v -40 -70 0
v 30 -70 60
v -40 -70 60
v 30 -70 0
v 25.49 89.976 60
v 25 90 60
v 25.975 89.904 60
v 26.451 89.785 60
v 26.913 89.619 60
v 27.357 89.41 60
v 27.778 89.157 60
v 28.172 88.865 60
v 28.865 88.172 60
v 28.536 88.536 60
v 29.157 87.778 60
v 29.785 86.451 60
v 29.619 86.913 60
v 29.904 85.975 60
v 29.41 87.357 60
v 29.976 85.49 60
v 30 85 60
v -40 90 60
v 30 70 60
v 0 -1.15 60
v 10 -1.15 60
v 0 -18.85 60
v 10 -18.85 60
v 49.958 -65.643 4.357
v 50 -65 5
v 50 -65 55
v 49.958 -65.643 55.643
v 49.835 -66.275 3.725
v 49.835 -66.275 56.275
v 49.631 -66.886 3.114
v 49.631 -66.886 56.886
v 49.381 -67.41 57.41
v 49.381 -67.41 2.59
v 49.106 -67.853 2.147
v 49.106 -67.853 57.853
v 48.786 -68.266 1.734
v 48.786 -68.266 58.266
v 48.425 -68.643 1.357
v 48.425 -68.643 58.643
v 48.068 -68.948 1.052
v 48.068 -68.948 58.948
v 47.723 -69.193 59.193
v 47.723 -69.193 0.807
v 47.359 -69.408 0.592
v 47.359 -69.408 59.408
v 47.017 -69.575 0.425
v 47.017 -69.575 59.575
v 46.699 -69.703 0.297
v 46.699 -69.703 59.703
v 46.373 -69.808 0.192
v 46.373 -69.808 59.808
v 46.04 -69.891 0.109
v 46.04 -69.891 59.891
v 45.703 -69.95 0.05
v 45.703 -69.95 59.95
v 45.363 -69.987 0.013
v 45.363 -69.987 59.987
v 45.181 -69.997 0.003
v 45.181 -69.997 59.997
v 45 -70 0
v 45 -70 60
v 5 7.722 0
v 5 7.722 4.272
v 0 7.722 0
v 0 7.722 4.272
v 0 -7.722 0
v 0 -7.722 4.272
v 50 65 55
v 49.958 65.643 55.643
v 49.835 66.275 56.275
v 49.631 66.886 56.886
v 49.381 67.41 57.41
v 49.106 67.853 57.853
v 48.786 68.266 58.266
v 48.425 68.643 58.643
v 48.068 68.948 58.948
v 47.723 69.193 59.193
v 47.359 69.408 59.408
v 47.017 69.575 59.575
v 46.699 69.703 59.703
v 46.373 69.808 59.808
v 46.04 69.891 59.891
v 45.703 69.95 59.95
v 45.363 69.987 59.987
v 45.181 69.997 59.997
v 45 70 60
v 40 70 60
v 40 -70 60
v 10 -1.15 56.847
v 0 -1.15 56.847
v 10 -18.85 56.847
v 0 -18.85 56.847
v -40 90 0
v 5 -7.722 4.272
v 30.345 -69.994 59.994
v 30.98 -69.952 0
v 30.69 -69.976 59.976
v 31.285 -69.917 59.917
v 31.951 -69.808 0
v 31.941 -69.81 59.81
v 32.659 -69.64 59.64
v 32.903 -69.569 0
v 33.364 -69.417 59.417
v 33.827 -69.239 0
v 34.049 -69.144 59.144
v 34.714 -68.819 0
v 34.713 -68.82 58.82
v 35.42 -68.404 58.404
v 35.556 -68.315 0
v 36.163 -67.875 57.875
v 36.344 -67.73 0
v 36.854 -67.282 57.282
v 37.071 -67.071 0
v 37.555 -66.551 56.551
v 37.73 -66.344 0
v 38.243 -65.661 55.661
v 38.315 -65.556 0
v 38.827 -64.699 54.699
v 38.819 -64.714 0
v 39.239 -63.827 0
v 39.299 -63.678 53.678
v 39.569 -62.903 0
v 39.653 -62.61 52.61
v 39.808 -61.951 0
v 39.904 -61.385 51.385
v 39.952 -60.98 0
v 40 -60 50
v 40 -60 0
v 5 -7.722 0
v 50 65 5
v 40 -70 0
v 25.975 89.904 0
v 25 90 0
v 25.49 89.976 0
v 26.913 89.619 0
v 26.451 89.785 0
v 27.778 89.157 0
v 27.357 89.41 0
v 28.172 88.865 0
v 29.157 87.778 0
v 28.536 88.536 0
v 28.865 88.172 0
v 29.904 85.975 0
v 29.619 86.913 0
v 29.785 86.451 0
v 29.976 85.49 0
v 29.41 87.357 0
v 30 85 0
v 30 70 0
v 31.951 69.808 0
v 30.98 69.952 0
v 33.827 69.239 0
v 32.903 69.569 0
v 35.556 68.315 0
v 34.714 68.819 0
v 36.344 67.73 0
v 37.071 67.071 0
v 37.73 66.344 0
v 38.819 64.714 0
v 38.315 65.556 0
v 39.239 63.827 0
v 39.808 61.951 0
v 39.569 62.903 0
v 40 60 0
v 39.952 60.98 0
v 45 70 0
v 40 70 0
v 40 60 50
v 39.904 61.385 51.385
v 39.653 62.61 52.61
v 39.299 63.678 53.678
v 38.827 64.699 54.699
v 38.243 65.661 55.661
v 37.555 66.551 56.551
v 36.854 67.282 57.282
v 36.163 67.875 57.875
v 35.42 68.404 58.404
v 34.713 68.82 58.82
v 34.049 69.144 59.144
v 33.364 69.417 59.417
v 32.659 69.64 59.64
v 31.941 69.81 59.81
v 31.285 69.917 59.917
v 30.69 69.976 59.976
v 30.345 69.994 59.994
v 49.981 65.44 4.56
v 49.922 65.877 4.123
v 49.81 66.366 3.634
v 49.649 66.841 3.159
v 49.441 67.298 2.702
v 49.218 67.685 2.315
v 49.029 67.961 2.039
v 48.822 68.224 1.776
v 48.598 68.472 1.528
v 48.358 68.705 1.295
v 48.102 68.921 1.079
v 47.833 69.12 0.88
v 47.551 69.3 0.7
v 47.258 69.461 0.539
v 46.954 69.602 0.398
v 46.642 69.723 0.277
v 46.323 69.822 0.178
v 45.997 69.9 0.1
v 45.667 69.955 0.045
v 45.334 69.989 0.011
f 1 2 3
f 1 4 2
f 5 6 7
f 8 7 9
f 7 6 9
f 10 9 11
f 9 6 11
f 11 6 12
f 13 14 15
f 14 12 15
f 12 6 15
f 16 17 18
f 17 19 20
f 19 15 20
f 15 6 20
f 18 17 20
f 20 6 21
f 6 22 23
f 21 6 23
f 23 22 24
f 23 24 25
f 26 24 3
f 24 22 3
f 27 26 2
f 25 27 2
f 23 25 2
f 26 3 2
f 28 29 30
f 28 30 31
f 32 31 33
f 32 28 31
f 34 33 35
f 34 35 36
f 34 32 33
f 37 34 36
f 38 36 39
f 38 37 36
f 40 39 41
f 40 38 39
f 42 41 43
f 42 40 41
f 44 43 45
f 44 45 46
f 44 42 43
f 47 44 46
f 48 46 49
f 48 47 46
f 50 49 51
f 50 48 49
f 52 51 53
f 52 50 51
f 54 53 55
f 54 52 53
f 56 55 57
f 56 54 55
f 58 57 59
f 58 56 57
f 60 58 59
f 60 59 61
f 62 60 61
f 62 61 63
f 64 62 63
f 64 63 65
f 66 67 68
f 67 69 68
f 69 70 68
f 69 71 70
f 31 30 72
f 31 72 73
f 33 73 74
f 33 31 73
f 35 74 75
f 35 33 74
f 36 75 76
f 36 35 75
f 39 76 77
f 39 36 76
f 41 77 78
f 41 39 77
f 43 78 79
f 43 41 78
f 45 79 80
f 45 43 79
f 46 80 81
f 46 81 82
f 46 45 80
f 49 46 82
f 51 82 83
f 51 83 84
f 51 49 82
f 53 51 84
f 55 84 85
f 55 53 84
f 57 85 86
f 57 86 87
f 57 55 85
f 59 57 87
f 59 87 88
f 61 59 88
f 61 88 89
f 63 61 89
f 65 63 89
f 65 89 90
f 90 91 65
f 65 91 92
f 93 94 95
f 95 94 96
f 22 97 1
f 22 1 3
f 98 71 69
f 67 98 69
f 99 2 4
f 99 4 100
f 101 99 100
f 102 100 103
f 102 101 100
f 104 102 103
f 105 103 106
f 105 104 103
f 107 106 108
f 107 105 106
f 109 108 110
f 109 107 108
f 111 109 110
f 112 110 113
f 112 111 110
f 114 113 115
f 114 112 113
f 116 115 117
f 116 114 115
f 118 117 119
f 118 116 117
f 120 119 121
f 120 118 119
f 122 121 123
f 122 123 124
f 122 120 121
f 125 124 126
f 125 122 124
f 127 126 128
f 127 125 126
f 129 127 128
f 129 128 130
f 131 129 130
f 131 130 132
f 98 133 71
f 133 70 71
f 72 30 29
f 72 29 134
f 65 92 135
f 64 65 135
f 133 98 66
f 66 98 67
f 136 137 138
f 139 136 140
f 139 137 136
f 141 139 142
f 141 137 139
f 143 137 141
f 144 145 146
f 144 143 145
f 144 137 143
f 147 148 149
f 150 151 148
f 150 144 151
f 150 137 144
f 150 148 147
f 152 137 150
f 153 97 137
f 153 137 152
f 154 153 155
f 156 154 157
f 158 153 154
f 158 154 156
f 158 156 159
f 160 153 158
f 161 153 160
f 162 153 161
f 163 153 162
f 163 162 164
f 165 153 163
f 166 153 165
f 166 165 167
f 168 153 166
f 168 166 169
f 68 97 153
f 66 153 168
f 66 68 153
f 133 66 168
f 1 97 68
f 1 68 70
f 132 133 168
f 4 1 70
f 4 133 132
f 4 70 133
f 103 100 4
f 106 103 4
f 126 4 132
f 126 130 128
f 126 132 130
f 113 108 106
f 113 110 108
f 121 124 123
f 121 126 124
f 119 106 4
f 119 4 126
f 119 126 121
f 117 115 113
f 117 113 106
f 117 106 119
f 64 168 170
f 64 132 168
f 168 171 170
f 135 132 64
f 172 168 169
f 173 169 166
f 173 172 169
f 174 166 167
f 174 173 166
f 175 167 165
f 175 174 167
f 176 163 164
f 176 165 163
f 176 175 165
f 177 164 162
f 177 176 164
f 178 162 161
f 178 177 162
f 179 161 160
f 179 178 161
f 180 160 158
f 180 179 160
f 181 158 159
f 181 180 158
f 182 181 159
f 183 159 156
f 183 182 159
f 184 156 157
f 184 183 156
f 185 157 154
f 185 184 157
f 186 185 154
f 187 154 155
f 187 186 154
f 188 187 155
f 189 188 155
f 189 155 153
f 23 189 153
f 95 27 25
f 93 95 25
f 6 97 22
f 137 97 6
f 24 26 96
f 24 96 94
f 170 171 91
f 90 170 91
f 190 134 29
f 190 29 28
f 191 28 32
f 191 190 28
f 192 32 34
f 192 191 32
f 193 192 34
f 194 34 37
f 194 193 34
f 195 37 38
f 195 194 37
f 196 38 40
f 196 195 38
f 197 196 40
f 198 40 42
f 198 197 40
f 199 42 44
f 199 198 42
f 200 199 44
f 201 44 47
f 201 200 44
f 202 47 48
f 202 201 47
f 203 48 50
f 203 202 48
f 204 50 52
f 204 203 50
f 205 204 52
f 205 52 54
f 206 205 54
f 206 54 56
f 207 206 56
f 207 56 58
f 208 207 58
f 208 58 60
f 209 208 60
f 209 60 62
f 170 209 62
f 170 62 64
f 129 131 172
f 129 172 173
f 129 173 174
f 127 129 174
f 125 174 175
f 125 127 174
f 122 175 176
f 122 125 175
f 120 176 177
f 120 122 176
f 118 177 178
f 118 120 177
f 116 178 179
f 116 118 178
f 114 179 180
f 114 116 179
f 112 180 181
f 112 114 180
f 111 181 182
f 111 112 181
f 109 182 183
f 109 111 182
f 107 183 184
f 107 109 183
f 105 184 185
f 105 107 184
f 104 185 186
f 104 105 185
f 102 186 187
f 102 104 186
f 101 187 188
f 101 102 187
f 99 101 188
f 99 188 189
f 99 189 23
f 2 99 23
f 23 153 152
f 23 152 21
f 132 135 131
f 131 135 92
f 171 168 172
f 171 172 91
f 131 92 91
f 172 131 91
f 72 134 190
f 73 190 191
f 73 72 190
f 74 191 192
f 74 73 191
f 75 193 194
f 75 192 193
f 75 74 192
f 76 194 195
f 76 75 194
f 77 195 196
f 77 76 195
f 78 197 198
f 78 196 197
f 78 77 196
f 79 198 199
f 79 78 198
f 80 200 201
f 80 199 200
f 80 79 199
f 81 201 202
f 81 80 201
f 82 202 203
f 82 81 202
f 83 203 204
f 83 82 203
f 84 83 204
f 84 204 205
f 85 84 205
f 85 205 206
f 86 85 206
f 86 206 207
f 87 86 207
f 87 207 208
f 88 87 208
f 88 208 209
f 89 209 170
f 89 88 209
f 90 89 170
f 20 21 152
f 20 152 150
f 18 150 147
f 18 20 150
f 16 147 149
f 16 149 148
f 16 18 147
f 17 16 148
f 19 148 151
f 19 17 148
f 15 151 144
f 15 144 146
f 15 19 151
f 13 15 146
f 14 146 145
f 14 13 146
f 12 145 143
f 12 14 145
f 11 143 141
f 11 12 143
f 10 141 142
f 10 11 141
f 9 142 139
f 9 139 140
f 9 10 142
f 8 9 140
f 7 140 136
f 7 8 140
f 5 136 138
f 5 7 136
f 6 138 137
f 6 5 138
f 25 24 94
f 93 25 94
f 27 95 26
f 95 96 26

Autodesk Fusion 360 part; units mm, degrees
sketch "Sketch1" plane through (0, 0, 0) normal (0, 0, 1) x (1, 0, 0)
  line L0 (40, -70) -> (-40, -70)
  line L1 (-40, -70) -> (-40, 70)
  line L2 (-40, 70) -> (40, 70)
  line L3 (40, 70) -> (40, -70)
  line L4 (40, -70) -> (-40, 70) construction
  line L5 (-40, -70) -> (40, 70) construction
extrude "Extrude1" add sketch "Sketch1" along normal blind 60
sketch "Sketch2" plane through (40, 0, 0) normal (1, 0, 0) x (0, 1, 0)
  line L0 (-70, 0) -> (70, 0)
  line L1 (70, 0) -> (70, 60)
  line L2 (70, 60) -> (-70, 60)
  line L3 (-70, 60) -> (-70, 0)
fillet "Fillet1" radius 10 3 edges at (40, 0, 60) (40, -70, 30) (40, 70, 30)
extrude "Extrude2" add sketch "Sketch2" along normal blind 10
extrude "Extrude3" add 1 faces at (-16.6667, 70, 20) along direction (0, 1, 0) blind 20
sketch "Sketch3" plane through (0, 0, 0) normal (1, 0, 0) x (0, 1, 0)
  line L0 (-1.1501, 56.847) -> (-18.8499, 56.847)
  line L1 (-18.8499, 56.847) -> (-18.8499, 63.153)
  line L2 (-18.8499, 63.153) -> (-1.1501, 63.153)
  line L3 (-1.1501, 63.153) -> (-1.1501, 56.847)
  line L4 (-1.1501, 56.847) -> (-18.8499, 63.153) construction
  line L5 (-18.8499, 56.847) -> (-1.1501, 63.153) construction
  point P0 (-10, 60)
extrude "Extrude4" cut sketch "Sketch3" along normal blind 10
fillet "Fillet2" radius 5 1 edges at (50, 0, 60) 1 faces at (50, -23.3333, 40)
sketch "Sketch4" plane through (0, 0, 0) normal (1, 0, 0) x (0, 1, 0)
  line L0 (7.722, -4.2717) -> (-7.722, -4.2717)
  line L1 (-7.722, -4.2717) -> (-7.722, 4.2717)
  line L2 (-7.722, 4.2717) -> (7.722, 4.2717)
  line L3 (7.722, 4.2717) -> (7.722, -4.2717)
  line L4 (7.722, -4.2717) -> (-7.722, 4.2717) construction
  line L5 (-7.722, -4.2717) -> (7.722, 4.2717) construction
extrude "Extrude5" cut sketch "Sketch4" along normal blind 5
fillet "Fillet3" radius 5 1 edges at (30, 90, 30)
